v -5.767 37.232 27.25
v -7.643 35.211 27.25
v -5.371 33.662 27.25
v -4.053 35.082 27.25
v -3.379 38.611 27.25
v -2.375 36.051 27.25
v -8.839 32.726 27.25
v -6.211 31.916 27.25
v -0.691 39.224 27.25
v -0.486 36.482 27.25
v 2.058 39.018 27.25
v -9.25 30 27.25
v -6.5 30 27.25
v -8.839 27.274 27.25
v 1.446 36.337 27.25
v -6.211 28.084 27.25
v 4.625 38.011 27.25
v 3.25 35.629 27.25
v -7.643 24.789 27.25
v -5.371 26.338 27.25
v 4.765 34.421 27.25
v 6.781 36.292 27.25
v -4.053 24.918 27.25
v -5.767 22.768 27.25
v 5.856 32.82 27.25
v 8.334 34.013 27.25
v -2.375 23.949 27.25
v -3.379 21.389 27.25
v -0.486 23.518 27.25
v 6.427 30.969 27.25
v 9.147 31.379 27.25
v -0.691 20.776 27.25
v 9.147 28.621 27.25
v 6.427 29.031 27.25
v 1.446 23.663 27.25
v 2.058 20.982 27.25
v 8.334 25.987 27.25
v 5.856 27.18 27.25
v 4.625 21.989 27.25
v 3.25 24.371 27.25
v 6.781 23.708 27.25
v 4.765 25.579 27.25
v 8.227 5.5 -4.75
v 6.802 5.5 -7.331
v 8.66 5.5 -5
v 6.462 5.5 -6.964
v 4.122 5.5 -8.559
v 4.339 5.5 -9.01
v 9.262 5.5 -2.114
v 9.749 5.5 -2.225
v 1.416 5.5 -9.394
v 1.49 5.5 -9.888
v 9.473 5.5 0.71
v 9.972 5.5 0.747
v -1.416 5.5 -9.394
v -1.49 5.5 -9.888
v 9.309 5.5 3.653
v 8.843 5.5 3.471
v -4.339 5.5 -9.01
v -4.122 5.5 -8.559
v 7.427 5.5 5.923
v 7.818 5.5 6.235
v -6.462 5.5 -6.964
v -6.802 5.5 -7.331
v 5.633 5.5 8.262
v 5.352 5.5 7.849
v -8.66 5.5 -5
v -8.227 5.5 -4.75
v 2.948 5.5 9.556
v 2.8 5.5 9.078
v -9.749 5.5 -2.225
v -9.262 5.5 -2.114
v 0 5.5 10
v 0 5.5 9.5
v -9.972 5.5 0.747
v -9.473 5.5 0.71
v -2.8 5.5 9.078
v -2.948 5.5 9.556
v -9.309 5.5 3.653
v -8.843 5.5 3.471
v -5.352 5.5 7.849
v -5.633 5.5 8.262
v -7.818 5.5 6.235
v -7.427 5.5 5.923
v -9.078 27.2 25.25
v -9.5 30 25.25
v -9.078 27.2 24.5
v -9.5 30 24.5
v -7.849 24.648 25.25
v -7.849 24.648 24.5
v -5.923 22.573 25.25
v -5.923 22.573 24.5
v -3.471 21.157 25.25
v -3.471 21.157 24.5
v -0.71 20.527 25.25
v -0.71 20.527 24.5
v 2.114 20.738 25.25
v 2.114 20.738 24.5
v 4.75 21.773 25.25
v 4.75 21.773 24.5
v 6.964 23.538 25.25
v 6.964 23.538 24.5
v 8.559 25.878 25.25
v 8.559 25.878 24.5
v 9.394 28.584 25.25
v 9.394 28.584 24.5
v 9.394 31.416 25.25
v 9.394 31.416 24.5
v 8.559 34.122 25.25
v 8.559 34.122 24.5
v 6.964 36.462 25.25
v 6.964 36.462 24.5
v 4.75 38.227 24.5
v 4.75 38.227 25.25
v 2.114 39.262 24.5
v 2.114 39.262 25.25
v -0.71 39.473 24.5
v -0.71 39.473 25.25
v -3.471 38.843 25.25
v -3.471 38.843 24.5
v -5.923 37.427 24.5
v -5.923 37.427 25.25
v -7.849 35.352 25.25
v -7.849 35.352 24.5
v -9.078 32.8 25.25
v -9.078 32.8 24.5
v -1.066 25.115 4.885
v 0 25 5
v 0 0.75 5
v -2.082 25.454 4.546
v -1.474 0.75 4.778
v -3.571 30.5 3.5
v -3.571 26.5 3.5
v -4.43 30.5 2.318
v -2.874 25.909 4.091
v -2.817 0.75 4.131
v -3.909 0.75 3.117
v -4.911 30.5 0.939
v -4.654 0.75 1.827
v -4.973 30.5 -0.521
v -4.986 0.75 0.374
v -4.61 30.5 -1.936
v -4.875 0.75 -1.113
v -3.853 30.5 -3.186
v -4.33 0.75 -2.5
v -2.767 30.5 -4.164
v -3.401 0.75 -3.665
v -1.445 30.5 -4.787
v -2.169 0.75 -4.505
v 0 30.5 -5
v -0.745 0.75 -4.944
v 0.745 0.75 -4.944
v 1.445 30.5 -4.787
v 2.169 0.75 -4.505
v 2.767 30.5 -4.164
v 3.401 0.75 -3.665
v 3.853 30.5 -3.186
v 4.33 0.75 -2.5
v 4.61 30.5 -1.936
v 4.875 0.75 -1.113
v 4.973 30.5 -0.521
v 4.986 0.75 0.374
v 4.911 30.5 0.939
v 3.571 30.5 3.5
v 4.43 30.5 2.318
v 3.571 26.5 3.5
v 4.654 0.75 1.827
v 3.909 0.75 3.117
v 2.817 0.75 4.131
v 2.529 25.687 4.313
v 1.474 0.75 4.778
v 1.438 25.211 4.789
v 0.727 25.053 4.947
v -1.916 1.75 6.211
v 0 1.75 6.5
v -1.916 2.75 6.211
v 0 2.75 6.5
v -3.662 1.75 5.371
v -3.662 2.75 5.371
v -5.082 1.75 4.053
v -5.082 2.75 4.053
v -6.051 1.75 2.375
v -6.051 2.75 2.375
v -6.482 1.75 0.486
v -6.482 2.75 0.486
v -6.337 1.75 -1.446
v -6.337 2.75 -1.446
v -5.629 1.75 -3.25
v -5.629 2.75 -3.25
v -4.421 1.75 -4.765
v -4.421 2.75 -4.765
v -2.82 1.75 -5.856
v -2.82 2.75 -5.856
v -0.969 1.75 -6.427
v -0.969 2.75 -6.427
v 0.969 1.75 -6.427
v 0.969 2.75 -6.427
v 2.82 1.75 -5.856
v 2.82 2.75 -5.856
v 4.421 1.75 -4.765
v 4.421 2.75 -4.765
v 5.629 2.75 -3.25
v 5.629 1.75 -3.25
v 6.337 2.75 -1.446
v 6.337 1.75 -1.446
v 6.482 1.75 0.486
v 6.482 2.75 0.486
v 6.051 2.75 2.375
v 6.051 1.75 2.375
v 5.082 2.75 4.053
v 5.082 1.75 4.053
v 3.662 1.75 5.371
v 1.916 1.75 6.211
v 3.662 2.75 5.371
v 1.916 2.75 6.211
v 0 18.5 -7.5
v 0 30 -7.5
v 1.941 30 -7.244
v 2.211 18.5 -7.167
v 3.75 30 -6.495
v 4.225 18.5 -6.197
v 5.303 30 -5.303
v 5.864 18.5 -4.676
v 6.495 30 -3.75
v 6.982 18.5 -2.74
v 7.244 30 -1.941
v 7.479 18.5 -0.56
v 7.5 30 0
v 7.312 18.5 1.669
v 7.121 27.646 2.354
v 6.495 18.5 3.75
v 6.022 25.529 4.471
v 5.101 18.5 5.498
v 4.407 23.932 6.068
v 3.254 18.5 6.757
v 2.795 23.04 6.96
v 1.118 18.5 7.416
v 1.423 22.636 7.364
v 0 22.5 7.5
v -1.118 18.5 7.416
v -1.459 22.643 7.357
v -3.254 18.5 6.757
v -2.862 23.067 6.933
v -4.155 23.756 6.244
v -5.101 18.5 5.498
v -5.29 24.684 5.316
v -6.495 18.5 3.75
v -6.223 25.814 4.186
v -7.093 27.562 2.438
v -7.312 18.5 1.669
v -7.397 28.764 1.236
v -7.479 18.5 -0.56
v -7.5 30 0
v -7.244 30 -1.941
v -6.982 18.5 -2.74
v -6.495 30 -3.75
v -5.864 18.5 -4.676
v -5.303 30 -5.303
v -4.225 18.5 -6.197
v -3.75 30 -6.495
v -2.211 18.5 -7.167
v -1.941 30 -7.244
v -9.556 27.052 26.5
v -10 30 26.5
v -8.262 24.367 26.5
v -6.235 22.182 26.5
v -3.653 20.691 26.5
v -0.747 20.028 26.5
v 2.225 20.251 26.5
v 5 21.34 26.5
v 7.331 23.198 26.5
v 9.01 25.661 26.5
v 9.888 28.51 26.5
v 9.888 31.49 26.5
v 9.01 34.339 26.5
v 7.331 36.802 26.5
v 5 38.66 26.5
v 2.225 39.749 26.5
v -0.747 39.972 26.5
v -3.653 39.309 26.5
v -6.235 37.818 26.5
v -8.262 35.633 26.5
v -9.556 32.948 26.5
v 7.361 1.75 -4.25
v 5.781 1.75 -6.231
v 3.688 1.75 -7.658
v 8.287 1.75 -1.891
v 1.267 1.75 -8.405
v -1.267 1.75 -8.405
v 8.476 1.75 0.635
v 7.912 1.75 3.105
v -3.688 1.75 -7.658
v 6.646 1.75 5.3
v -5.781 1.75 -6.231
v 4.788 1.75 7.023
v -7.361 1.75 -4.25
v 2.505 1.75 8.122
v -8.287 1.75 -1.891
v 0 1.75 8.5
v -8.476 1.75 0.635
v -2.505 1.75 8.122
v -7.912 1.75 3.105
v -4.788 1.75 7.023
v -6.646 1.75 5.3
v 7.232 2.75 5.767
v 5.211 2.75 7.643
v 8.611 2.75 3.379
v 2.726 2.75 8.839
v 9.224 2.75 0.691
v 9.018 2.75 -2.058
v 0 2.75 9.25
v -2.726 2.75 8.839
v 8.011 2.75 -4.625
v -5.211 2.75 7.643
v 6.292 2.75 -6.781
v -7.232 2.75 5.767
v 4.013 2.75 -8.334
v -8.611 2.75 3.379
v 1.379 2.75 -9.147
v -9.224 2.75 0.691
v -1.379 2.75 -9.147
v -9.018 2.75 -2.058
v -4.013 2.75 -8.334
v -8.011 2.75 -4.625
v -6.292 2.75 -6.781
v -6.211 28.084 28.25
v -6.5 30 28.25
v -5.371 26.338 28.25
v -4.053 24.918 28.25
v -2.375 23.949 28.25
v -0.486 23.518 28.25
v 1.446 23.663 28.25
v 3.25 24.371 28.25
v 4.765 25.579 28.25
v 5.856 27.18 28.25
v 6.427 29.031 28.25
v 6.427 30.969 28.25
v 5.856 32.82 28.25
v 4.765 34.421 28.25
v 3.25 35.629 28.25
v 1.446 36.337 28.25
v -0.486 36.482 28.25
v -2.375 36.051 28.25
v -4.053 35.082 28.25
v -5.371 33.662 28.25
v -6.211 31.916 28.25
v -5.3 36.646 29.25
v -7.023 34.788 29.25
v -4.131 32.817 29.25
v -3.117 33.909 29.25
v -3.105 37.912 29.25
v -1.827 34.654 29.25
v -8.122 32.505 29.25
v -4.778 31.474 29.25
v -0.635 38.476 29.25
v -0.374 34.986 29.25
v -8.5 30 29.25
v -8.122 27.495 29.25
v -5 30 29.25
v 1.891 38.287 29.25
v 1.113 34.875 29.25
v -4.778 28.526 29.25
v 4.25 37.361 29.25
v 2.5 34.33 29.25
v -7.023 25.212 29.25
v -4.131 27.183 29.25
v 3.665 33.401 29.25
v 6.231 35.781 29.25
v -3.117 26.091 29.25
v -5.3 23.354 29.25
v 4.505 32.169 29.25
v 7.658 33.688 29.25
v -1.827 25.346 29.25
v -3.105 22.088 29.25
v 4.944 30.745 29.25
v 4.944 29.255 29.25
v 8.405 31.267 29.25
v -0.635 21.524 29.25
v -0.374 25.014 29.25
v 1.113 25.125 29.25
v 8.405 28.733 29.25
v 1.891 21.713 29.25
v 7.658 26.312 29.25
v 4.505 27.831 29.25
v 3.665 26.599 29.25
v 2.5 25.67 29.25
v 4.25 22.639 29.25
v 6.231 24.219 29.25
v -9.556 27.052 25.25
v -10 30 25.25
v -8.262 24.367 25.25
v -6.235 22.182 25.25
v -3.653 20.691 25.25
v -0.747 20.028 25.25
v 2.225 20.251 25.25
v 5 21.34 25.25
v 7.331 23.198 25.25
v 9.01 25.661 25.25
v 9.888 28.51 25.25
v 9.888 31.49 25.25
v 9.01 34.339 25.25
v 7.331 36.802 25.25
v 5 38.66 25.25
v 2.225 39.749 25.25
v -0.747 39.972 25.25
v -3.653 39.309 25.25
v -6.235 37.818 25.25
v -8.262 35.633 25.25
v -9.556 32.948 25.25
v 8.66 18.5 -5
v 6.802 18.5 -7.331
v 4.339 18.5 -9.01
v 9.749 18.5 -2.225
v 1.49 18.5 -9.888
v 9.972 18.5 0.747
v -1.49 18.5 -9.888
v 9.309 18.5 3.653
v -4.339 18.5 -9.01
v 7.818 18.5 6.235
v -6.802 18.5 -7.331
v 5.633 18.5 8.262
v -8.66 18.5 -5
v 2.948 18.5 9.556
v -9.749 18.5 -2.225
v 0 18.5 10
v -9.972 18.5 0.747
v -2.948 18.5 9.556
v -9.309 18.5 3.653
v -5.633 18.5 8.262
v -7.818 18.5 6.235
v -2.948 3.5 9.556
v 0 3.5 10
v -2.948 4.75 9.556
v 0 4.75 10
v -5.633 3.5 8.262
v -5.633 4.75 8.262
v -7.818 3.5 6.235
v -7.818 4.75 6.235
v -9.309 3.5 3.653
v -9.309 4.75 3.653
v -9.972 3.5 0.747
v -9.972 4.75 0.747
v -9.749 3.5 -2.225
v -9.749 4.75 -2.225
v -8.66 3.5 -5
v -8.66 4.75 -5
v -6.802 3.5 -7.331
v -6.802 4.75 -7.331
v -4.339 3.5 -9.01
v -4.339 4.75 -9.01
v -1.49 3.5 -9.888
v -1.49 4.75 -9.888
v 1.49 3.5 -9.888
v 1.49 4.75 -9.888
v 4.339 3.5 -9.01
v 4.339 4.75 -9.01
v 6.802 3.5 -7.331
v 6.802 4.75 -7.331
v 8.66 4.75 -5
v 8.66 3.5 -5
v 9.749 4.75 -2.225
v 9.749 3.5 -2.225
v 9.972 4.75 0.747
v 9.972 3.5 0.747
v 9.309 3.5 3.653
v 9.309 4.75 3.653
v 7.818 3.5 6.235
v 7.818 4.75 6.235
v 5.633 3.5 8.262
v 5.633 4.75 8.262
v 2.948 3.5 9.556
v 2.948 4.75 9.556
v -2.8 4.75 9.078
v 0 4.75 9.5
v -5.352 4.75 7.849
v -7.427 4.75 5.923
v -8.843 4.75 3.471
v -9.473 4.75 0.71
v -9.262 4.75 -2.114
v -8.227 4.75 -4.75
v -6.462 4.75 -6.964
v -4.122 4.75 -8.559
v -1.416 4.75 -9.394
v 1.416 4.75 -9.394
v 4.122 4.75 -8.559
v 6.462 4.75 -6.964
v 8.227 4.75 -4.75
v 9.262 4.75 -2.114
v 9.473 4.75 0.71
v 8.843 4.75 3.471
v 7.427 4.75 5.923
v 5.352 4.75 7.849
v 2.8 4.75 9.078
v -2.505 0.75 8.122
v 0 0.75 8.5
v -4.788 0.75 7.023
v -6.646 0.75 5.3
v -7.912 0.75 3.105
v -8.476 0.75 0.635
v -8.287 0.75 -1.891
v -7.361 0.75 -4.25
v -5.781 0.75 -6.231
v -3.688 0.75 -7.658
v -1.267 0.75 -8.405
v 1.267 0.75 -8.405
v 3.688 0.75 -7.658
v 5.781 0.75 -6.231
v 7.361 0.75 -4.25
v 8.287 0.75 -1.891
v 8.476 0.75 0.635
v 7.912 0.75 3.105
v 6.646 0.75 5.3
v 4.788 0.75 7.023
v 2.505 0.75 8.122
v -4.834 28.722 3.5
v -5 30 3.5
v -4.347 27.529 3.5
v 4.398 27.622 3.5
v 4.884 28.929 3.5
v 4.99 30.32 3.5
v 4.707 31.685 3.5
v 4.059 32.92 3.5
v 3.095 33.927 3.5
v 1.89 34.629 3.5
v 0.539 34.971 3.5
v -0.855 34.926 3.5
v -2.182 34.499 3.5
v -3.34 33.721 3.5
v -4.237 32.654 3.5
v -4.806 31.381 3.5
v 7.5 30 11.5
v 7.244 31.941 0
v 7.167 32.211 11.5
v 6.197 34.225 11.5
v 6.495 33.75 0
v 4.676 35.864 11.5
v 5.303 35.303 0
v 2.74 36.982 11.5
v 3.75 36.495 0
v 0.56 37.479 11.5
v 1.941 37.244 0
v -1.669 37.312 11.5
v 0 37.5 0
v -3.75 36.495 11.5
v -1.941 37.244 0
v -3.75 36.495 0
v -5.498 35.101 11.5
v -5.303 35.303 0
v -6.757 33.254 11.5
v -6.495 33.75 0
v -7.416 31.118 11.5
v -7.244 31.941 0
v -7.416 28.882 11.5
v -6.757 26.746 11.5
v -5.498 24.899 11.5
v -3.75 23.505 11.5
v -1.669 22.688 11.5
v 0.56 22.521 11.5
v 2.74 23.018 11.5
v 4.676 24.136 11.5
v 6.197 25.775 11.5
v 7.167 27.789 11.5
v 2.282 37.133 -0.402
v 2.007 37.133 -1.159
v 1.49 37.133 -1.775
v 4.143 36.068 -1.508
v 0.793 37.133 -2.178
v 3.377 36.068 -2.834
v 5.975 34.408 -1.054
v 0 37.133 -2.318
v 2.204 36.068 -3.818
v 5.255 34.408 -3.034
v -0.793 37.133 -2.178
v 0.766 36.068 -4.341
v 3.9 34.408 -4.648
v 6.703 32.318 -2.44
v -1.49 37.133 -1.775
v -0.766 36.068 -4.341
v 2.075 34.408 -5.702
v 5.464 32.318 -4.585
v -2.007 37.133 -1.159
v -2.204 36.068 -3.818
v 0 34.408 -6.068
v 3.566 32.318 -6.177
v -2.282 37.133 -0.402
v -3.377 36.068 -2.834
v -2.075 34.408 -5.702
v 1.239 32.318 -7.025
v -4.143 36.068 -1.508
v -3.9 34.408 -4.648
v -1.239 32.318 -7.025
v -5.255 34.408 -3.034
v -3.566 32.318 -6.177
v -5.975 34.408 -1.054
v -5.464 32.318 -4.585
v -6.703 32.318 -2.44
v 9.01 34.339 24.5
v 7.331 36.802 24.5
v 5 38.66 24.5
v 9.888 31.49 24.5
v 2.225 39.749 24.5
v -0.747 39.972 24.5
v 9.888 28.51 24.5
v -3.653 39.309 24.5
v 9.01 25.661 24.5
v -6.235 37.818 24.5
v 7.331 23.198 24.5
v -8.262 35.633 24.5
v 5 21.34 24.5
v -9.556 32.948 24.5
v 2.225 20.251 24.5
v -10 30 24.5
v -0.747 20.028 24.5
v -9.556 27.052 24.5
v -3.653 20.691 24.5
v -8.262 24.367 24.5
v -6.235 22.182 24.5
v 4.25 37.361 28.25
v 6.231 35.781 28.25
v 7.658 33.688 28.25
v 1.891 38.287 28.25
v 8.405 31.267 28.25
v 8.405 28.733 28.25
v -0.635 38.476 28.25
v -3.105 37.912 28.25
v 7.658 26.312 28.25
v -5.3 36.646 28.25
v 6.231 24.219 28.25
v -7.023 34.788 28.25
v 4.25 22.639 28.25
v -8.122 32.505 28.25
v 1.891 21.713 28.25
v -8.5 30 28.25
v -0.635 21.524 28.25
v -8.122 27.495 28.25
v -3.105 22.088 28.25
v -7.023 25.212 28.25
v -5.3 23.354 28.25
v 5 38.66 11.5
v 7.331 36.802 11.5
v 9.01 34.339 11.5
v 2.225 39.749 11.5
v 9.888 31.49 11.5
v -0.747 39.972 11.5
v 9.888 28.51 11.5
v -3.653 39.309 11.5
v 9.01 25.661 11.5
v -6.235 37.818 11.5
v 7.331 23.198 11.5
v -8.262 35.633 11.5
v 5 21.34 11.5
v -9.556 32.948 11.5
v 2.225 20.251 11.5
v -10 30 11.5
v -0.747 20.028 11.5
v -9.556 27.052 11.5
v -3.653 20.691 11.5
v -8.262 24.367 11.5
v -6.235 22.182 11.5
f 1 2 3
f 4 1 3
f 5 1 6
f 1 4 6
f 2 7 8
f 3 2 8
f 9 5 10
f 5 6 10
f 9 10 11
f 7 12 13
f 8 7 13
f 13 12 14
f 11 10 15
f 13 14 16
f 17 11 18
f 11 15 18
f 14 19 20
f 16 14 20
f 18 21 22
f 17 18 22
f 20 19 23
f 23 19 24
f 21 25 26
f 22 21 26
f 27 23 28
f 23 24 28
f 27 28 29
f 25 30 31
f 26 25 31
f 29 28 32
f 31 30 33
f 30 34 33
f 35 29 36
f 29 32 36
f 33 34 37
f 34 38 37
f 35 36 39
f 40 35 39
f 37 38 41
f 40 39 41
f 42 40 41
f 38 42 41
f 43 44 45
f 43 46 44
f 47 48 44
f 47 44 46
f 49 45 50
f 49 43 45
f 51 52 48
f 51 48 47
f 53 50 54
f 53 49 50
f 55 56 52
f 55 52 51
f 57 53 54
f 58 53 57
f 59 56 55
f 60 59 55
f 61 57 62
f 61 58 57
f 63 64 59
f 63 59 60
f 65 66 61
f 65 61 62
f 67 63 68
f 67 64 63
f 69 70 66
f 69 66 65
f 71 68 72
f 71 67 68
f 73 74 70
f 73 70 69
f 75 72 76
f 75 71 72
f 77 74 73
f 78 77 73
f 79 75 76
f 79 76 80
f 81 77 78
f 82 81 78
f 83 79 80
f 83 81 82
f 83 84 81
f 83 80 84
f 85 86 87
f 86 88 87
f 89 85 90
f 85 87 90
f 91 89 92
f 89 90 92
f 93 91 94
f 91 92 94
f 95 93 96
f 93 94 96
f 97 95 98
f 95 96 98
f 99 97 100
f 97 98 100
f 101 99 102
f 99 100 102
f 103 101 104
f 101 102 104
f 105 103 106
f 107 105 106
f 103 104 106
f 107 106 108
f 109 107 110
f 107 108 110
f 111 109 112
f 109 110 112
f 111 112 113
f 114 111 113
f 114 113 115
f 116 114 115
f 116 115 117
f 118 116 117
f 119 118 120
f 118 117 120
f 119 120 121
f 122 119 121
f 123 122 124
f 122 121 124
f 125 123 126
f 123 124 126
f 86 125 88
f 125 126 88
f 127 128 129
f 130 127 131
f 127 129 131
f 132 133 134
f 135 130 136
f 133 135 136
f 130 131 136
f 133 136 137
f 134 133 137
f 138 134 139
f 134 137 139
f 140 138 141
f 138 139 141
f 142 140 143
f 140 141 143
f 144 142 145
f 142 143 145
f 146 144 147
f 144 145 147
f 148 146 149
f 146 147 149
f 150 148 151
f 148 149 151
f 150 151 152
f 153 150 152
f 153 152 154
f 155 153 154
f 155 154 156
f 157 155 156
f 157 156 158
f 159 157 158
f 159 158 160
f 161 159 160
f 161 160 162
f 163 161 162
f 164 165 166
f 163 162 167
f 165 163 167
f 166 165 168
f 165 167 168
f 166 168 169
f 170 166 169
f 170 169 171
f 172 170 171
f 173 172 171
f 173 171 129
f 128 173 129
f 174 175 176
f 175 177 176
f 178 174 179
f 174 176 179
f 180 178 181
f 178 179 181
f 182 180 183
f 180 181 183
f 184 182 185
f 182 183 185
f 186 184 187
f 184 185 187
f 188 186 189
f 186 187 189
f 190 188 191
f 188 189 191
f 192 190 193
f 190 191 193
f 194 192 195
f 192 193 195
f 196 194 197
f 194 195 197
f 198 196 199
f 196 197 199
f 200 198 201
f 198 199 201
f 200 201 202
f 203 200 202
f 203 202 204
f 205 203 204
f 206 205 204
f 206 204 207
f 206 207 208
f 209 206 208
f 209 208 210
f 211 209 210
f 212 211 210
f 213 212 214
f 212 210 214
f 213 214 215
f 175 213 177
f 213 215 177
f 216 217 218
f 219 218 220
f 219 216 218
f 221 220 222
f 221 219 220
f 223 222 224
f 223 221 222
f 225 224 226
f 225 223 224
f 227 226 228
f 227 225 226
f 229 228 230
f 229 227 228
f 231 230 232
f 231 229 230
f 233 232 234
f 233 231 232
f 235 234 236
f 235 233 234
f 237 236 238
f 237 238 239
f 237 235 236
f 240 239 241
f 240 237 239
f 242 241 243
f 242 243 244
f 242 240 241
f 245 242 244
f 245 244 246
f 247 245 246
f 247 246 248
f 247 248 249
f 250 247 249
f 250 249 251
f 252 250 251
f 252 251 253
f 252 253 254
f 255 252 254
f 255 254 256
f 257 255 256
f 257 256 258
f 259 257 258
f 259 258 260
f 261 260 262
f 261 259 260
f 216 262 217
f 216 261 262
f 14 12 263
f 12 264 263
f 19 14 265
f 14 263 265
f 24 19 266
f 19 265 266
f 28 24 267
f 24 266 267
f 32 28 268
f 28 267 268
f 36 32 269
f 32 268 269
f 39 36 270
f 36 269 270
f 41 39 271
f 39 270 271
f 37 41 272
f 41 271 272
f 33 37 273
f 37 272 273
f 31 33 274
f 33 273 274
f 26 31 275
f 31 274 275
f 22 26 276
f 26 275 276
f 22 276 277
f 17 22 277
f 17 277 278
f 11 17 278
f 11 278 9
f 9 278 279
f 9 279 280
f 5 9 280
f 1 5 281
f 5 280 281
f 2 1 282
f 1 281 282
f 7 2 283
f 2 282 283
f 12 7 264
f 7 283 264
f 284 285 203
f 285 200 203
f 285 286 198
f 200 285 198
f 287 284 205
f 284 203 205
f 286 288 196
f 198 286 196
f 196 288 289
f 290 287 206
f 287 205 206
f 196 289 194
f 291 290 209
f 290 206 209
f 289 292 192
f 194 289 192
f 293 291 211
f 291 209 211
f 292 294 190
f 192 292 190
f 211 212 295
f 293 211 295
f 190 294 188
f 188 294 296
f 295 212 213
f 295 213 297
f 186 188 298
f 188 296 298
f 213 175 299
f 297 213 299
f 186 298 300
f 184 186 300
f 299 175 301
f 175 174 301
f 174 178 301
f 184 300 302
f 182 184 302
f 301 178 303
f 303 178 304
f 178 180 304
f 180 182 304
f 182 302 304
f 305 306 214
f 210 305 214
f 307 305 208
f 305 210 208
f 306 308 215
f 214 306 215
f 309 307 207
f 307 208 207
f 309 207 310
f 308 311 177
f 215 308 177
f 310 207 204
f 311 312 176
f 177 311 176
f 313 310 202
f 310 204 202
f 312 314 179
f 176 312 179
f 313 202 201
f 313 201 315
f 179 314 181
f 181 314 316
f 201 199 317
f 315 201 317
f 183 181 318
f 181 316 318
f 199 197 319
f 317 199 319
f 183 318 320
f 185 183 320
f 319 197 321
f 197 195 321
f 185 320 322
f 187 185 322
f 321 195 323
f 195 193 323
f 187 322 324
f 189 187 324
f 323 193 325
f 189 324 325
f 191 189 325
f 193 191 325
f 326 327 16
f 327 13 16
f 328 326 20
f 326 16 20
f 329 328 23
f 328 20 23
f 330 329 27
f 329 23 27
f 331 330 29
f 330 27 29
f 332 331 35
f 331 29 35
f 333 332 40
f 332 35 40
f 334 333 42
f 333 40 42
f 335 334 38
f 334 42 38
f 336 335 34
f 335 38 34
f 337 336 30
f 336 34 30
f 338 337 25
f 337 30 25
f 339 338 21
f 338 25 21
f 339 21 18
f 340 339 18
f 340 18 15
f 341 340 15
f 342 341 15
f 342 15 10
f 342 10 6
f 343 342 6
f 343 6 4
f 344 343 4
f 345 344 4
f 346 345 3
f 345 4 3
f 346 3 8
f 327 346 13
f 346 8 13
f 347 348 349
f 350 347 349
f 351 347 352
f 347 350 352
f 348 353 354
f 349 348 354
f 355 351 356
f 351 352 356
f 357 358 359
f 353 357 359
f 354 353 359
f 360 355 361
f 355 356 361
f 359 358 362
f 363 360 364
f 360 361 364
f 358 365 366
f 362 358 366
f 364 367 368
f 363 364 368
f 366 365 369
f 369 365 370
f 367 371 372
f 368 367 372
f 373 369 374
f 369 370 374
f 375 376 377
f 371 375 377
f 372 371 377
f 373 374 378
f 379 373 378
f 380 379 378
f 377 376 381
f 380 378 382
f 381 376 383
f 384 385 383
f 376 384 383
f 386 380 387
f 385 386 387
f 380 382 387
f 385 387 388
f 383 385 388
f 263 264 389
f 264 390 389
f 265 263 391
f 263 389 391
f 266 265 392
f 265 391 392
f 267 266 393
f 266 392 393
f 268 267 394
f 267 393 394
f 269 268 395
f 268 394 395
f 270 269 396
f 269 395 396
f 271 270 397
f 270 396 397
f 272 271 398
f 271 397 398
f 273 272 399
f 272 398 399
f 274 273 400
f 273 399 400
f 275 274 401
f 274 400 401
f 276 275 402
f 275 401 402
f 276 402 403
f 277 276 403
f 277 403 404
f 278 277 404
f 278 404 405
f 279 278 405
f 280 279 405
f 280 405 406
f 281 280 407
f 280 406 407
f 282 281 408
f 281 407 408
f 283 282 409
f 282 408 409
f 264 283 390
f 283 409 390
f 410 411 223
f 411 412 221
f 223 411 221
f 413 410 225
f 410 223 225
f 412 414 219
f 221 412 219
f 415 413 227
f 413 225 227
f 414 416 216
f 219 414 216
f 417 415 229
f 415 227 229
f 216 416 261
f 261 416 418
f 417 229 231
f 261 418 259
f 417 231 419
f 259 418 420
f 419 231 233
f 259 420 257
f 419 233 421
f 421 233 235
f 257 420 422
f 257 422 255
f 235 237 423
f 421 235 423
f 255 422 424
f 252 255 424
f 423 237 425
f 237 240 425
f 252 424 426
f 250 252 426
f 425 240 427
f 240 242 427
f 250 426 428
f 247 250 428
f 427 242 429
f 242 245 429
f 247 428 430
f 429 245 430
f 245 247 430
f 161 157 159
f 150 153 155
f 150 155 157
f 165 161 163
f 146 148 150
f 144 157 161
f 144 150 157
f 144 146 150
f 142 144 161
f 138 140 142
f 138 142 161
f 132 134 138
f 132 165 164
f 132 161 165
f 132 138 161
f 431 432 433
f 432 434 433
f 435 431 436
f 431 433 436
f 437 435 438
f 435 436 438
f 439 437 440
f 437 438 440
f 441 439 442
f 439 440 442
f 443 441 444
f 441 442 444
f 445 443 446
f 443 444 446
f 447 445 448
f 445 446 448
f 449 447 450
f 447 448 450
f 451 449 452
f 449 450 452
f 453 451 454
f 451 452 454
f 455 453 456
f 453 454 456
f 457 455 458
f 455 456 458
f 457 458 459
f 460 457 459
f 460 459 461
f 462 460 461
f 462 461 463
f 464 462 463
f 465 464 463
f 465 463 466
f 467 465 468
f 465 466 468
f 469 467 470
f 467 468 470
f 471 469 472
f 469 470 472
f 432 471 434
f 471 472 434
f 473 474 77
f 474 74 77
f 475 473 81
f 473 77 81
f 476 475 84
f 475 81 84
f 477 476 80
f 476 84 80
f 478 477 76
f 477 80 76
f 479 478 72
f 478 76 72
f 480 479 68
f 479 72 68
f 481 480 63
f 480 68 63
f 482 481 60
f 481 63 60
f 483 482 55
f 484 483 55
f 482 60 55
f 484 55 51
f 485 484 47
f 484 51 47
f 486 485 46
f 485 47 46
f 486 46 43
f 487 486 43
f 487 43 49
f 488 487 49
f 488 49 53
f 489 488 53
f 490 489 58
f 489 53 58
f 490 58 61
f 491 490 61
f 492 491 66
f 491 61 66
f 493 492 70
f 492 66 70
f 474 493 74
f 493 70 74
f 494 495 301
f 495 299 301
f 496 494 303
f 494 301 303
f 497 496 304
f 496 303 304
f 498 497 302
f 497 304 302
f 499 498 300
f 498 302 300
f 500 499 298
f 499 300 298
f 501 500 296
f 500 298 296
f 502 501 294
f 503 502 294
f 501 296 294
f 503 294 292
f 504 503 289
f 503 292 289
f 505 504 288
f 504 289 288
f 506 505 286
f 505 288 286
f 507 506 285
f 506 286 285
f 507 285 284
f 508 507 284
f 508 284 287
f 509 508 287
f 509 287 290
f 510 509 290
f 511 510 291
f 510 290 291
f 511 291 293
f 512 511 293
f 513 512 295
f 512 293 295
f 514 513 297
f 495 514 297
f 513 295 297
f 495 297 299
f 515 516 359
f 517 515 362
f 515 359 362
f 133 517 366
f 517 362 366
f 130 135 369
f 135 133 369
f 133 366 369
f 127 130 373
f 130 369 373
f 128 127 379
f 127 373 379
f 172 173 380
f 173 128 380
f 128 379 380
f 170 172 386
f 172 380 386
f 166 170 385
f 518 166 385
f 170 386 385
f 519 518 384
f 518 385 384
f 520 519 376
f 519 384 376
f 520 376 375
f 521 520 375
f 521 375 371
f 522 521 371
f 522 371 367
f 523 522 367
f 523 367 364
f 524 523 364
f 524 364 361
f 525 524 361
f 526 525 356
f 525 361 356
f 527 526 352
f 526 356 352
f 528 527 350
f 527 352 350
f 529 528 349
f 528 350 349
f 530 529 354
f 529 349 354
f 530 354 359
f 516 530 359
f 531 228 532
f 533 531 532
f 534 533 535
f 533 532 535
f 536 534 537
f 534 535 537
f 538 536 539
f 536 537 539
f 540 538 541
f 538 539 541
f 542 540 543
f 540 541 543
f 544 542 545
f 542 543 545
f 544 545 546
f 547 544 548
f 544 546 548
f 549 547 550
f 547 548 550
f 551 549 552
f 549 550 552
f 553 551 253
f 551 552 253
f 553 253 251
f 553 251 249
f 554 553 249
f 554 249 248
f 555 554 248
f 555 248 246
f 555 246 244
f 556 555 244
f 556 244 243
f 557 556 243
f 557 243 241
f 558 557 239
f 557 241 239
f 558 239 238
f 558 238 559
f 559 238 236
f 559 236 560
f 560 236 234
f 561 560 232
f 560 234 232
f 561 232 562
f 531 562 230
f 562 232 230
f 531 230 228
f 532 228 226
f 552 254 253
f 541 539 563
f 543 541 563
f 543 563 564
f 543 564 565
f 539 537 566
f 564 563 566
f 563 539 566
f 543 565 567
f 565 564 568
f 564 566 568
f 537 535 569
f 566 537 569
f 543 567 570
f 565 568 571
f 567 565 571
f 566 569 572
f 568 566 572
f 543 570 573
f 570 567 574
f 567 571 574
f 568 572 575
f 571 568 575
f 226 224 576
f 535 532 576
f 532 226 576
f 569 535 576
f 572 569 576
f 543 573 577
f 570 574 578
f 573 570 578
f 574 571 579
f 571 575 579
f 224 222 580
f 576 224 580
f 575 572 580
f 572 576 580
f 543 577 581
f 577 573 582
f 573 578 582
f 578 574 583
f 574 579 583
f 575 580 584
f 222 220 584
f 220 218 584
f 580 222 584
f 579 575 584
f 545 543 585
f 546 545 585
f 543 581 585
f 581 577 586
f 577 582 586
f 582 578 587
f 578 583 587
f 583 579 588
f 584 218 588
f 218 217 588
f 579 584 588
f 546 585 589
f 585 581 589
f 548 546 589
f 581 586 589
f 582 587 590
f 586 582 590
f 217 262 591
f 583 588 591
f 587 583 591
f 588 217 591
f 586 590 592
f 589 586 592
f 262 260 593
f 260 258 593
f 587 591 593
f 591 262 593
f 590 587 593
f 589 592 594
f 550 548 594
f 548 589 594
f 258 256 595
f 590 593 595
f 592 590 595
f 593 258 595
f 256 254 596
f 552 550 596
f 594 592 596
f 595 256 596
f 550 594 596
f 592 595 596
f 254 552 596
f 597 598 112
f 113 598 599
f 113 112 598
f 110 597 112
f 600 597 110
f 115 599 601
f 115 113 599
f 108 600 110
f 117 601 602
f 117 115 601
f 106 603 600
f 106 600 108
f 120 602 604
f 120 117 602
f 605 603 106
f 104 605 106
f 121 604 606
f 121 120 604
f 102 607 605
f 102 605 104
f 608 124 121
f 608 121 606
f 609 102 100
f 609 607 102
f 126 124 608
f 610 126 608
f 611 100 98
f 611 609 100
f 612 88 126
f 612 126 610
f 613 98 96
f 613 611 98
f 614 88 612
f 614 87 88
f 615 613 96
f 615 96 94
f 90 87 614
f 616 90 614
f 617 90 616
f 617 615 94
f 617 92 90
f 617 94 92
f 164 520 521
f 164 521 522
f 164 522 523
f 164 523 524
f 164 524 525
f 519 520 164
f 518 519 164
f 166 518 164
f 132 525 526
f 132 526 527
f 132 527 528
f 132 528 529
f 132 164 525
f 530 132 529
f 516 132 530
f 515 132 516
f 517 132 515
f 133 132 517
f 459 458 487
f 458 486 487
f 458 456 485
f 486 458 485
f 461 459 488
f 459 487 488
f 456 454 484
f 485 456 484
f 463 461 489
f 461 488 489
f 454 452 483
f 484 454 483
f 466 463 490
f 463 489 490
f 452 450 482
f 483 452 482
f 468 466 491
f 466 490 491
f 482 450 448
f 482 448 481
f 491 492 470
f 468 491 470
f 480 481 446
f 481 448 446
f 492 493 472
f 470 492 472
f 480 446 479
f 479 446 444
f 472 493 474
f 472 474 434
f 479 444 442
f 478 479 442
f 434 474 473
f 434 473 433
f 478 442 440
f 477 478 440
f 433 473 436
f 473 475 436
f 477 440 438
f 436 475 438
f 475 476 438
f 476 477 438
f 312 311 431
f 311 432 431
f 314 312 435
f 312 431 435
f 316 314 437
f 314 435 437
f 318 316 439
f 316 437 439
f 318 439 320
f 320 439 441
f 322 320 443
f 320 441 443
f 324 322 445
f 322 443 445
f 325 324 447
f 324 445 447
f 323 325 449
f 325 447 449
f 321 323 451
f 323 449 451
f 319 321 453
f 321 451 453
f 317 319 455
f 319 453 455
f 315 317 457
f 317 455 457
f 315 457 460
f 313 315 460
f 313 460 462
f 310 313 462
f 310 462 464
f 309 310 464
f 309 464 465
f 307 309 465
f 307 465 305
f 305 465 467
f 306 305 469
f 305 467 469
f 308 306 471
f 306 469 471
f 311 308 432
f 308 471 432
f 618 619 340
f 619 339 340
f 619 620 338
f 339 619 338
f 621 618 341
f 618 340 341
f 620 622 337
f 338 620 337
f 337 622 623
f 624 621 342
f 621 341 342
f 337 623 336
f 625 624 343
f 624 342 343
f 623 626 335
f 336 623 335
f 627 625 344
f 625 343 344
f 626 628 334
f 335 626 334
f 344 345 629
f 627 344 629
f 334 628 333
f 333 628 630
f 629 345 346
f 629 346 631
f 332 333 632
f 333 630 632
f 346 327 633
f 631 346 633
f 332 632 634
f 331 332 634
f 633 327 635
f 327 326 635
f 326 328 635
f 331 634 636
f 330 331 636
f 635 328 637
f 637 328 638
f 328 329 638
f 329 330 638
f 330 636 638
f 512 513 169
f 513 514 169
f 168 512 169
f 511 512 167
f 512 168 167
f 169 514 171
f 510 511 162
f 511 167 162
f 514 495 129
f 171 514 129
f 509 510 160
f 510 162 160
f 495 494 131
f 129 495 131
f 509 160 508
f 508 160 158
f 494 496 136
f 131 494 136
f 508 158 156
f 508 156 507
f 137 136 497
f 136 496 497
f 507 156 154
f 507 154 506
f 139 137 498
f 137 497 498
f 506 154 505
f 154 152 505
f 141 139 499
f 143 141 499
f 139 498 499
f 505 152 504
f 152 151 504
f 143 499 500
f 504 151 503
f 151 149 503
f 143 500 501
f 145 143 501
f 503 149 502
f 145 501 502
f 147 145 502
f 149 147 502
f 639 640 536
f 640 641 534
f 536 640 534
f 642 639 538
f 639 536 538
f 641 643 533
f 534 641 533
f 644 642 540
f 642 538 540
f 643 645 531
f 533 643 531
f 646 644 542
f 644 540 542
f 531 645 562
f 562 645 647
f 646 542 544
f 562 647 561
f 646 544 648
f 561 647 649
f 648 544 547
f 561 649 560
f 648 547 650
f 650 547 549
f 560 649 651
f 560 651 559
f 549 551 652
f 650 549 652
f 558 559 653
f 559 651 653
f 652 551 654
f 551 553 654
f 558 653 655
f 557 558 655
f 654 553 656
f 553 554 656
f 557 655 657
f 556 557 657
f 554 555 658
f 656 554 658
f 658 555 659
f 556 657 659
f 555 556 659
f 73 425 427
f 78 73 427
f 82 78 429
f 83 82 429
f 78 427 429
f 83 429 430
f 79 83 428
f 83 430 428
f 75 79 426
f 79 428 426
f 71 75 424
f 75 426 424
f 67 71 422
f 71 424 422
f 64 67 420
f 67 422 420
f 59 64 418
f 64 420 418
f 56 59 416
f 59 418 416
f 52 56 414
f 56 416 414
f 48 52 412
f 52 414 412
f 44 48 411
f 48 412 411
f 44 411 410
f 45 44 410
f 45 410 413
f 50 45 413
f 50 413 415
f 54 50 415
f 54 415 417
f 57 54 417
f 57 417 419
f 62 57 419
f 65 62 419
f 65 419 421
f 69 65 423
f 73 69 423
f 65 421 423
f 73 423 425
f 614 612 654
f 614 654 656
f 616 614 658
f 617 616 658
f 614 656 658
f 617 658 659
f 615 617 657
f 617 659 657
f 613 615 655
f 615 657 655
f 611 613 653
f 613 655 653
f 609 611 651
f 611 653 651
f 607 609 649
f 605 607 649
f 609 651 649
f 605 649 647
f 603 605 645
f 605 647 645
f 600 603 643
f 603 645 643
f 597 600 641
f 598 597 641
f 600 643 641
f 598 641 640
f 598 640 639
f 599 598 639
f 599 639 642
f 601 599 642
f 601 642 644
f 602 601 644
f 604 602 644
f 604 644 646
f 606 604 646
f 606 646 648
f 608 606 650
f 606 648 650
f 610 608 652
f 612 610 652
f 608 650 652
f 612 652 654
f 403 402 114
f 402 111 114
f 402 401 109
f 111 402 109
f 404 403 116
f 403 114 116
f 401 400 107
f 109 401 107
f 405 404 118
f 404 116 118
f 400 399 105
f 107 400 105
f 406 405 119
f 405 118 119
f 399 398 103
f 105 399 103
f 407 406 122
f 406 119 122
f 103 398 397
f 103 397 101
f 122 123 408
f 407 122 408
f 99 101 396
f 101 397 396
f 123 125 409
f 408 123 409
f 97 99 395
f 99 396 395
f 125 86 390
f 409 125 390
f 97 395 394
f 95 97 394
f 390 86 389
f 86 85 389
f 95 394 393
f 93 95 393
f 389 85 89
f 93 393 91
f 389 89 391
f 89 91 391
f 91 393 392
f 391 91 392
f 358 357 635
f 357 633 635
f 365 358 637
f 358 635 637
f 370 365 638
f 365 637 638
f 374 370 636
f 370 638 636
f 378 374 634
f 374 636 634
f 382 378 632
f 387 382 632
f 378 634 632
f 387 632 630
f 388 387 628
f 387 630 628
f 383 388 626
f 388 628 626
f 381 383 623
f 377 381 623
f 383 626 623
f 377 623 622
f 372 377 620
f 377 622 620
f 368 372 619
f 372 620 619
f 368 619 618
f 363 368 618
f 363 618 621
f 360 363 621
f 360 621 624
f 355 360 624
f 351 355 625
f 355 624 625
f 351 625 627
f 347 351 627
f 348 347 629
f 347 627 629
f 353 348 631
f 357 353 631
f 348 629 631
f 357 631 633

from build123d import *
from build123d.topology import SkipClean

# Parameters (mm, degrees)
SKETCH_3_R          = 7.5
EXTRUDE_2_DEPTH     = 11.5
SKETCH_4_R          = 10
EXTRUDE_3_DEPTH     = 13
EXTRUDE_START       = 4
SKETCH_7_R          = 7.5
EXTRUDE_4_DEPTH     = 4
SKETCH_8_R          = 10
EXTRUDE_6_DEPTH     = 13
SKETCH_10_R         = 5
CUT_EXTRUDE_1_DEPTH = 25
SKETCH_11_R         = 5
CUT_EXTRUDE_2_DEPTH = 21


with BuildPart() as part:
    # Эскиз2 → Повернуть1 (revolve)
    with BuildSketch(Plane.XY, mode=Mode.PRIVATE) as revolve_1_sk:
        with BuildLine():
            Line((0, 22.5), (0, 37.5))
            ThreePointArc((0, 37.5), (5.303300859, 35.303300859), (7.5, 30))
            Line((7.5, 30), (7.5, 22.5))
            Line((7.5, 22.5), (0, 22.5))
        make_face()
    revolve(revolve_1_sk.sketch.rotate(Axis((0, 22.5, 0), (0, 1, 0)), 90), axis=Axis((0, 22.5, 0), (0, 1, 0)))

    # Эскиз3 → Бобышка-Вытянуть2 (add)
    with SkipClean():  # the faces are left unmerged after this step: merging them gives an invalid solid
        with BuildSketch(Plane.XY):
            with Locations((0, 30)):
                Circle(SKETCH_3_R)
        extrude(amount=EXTRUDE_2_DEPTH)

    # Эскиз4 → Бобышка-Вытянуть3 (add)
    with SkipClean():  # the faces are left unmerged after this step: merging them gives an invalid solid
        with BuildSketch(Plane.XY.offset(11.5)):
            with Locations(Location((0, 30, 0), (0, 0, 180))):
                Circle(SKETCH_4_R)
        extrude(amount=EXTRUDE_3_DEPTH)

    # Эскиз7 → Бобышка-Вытянуть4 (add)
    with BuildSketch(Plane.XZ.offset(-22.5).offset(EXTRUDE_START)):
        with Locations(Location((0, 0, 0), (0, 0, 270))):
            Circle(SKETCH_7_R)
    extrude(amount=-EXTRUDE_4_DEPTH)

    # Эскиз8 → Бобышка-Вытянуть6 (add)
    with BuildSketch(Plane.XZ.offset(-18.5)):
        with Locations(Location((0, 0, 0), (0, 0, 90))):
            Circle(SKETCH_8_R)
    extrude(amount=EXTRUDE_6_DEPTH)

    # Эскиз9 → Повернуть5 (revolve)
    with BuildSketch(Plane(origin=(0, 0, 0), x_dir=(0, 0, -1), z_dir=(1, 0, 0)), mode=Mode.PRIVATE) as revolve_5_sk:
        Polygon((8.5, 1.75), (6.5, 1.75), (6.5, 2.75), (9.25, 2.75), (10, 3.5), (10, 4.75), (9.5, 4.75), (9.5, 5.5), (5, 5.5), (5, 0.75), (8.5, 0.75), align=None)
    revolve(revolve_5_sk.sketch.rotate(Axis((0, 5.5, 0), (0, -1, 0)), 180), axis=Axis((0, 5.5, 0), (0, -1, 0)))

    # Эскиз14 → Повернуть6 (revolve)
    with BuildSketch(Plane(origin=(0, 0, 0), x_dir=(0, 0, -1), z_dir=(1, 0, 0)), mode=Mode.PRIVATE) as revolve_6_sk:
        Polygon((-28.25, 21.5), (-28.25, 23.5), (-27.25, 23.5), (-27.25, 20.75), (-26.5, 20), (-25.25, 20), (-25.25, 20.5), (-24.5, 20.5), (-24.5, 25), (-29.25, 25), (-29.25, 21.5), align=None)
    revolve(revolve_6_sk.sketch.rotate(Axis((0, 30, 24.5), (0, 0, 1)), 270), axis=Axis((0, 30, 24.5), (0, 0, 1)))

    # Эскиз10 → Вырез-Вытянуть1 (cut)
    with BuildSketch(Plane.XZ.offset(-5.5)):
        with Locations(Location((0, 0, 0), (0, 0, 90))):
            Circle(SKETCH_10_R)
    extrude(amount=-CUT_EXTRUDE_1_DEPTH, mode=Mode.SUBTRACT)

    # Эскиз11 → Вырез-Вытянуть2 (cut)
    with BuildSketch(Plane.XY.offset(24.5)):
        with Locations(Location((0, 30, 0), (0, 0, 180))):
            Circle(SKETCH_11_R)
    extrude(amount=-CUT_EXTRUDE_2_DEPTH, mode=Mode.SUBTRACT)


solid = part.part
